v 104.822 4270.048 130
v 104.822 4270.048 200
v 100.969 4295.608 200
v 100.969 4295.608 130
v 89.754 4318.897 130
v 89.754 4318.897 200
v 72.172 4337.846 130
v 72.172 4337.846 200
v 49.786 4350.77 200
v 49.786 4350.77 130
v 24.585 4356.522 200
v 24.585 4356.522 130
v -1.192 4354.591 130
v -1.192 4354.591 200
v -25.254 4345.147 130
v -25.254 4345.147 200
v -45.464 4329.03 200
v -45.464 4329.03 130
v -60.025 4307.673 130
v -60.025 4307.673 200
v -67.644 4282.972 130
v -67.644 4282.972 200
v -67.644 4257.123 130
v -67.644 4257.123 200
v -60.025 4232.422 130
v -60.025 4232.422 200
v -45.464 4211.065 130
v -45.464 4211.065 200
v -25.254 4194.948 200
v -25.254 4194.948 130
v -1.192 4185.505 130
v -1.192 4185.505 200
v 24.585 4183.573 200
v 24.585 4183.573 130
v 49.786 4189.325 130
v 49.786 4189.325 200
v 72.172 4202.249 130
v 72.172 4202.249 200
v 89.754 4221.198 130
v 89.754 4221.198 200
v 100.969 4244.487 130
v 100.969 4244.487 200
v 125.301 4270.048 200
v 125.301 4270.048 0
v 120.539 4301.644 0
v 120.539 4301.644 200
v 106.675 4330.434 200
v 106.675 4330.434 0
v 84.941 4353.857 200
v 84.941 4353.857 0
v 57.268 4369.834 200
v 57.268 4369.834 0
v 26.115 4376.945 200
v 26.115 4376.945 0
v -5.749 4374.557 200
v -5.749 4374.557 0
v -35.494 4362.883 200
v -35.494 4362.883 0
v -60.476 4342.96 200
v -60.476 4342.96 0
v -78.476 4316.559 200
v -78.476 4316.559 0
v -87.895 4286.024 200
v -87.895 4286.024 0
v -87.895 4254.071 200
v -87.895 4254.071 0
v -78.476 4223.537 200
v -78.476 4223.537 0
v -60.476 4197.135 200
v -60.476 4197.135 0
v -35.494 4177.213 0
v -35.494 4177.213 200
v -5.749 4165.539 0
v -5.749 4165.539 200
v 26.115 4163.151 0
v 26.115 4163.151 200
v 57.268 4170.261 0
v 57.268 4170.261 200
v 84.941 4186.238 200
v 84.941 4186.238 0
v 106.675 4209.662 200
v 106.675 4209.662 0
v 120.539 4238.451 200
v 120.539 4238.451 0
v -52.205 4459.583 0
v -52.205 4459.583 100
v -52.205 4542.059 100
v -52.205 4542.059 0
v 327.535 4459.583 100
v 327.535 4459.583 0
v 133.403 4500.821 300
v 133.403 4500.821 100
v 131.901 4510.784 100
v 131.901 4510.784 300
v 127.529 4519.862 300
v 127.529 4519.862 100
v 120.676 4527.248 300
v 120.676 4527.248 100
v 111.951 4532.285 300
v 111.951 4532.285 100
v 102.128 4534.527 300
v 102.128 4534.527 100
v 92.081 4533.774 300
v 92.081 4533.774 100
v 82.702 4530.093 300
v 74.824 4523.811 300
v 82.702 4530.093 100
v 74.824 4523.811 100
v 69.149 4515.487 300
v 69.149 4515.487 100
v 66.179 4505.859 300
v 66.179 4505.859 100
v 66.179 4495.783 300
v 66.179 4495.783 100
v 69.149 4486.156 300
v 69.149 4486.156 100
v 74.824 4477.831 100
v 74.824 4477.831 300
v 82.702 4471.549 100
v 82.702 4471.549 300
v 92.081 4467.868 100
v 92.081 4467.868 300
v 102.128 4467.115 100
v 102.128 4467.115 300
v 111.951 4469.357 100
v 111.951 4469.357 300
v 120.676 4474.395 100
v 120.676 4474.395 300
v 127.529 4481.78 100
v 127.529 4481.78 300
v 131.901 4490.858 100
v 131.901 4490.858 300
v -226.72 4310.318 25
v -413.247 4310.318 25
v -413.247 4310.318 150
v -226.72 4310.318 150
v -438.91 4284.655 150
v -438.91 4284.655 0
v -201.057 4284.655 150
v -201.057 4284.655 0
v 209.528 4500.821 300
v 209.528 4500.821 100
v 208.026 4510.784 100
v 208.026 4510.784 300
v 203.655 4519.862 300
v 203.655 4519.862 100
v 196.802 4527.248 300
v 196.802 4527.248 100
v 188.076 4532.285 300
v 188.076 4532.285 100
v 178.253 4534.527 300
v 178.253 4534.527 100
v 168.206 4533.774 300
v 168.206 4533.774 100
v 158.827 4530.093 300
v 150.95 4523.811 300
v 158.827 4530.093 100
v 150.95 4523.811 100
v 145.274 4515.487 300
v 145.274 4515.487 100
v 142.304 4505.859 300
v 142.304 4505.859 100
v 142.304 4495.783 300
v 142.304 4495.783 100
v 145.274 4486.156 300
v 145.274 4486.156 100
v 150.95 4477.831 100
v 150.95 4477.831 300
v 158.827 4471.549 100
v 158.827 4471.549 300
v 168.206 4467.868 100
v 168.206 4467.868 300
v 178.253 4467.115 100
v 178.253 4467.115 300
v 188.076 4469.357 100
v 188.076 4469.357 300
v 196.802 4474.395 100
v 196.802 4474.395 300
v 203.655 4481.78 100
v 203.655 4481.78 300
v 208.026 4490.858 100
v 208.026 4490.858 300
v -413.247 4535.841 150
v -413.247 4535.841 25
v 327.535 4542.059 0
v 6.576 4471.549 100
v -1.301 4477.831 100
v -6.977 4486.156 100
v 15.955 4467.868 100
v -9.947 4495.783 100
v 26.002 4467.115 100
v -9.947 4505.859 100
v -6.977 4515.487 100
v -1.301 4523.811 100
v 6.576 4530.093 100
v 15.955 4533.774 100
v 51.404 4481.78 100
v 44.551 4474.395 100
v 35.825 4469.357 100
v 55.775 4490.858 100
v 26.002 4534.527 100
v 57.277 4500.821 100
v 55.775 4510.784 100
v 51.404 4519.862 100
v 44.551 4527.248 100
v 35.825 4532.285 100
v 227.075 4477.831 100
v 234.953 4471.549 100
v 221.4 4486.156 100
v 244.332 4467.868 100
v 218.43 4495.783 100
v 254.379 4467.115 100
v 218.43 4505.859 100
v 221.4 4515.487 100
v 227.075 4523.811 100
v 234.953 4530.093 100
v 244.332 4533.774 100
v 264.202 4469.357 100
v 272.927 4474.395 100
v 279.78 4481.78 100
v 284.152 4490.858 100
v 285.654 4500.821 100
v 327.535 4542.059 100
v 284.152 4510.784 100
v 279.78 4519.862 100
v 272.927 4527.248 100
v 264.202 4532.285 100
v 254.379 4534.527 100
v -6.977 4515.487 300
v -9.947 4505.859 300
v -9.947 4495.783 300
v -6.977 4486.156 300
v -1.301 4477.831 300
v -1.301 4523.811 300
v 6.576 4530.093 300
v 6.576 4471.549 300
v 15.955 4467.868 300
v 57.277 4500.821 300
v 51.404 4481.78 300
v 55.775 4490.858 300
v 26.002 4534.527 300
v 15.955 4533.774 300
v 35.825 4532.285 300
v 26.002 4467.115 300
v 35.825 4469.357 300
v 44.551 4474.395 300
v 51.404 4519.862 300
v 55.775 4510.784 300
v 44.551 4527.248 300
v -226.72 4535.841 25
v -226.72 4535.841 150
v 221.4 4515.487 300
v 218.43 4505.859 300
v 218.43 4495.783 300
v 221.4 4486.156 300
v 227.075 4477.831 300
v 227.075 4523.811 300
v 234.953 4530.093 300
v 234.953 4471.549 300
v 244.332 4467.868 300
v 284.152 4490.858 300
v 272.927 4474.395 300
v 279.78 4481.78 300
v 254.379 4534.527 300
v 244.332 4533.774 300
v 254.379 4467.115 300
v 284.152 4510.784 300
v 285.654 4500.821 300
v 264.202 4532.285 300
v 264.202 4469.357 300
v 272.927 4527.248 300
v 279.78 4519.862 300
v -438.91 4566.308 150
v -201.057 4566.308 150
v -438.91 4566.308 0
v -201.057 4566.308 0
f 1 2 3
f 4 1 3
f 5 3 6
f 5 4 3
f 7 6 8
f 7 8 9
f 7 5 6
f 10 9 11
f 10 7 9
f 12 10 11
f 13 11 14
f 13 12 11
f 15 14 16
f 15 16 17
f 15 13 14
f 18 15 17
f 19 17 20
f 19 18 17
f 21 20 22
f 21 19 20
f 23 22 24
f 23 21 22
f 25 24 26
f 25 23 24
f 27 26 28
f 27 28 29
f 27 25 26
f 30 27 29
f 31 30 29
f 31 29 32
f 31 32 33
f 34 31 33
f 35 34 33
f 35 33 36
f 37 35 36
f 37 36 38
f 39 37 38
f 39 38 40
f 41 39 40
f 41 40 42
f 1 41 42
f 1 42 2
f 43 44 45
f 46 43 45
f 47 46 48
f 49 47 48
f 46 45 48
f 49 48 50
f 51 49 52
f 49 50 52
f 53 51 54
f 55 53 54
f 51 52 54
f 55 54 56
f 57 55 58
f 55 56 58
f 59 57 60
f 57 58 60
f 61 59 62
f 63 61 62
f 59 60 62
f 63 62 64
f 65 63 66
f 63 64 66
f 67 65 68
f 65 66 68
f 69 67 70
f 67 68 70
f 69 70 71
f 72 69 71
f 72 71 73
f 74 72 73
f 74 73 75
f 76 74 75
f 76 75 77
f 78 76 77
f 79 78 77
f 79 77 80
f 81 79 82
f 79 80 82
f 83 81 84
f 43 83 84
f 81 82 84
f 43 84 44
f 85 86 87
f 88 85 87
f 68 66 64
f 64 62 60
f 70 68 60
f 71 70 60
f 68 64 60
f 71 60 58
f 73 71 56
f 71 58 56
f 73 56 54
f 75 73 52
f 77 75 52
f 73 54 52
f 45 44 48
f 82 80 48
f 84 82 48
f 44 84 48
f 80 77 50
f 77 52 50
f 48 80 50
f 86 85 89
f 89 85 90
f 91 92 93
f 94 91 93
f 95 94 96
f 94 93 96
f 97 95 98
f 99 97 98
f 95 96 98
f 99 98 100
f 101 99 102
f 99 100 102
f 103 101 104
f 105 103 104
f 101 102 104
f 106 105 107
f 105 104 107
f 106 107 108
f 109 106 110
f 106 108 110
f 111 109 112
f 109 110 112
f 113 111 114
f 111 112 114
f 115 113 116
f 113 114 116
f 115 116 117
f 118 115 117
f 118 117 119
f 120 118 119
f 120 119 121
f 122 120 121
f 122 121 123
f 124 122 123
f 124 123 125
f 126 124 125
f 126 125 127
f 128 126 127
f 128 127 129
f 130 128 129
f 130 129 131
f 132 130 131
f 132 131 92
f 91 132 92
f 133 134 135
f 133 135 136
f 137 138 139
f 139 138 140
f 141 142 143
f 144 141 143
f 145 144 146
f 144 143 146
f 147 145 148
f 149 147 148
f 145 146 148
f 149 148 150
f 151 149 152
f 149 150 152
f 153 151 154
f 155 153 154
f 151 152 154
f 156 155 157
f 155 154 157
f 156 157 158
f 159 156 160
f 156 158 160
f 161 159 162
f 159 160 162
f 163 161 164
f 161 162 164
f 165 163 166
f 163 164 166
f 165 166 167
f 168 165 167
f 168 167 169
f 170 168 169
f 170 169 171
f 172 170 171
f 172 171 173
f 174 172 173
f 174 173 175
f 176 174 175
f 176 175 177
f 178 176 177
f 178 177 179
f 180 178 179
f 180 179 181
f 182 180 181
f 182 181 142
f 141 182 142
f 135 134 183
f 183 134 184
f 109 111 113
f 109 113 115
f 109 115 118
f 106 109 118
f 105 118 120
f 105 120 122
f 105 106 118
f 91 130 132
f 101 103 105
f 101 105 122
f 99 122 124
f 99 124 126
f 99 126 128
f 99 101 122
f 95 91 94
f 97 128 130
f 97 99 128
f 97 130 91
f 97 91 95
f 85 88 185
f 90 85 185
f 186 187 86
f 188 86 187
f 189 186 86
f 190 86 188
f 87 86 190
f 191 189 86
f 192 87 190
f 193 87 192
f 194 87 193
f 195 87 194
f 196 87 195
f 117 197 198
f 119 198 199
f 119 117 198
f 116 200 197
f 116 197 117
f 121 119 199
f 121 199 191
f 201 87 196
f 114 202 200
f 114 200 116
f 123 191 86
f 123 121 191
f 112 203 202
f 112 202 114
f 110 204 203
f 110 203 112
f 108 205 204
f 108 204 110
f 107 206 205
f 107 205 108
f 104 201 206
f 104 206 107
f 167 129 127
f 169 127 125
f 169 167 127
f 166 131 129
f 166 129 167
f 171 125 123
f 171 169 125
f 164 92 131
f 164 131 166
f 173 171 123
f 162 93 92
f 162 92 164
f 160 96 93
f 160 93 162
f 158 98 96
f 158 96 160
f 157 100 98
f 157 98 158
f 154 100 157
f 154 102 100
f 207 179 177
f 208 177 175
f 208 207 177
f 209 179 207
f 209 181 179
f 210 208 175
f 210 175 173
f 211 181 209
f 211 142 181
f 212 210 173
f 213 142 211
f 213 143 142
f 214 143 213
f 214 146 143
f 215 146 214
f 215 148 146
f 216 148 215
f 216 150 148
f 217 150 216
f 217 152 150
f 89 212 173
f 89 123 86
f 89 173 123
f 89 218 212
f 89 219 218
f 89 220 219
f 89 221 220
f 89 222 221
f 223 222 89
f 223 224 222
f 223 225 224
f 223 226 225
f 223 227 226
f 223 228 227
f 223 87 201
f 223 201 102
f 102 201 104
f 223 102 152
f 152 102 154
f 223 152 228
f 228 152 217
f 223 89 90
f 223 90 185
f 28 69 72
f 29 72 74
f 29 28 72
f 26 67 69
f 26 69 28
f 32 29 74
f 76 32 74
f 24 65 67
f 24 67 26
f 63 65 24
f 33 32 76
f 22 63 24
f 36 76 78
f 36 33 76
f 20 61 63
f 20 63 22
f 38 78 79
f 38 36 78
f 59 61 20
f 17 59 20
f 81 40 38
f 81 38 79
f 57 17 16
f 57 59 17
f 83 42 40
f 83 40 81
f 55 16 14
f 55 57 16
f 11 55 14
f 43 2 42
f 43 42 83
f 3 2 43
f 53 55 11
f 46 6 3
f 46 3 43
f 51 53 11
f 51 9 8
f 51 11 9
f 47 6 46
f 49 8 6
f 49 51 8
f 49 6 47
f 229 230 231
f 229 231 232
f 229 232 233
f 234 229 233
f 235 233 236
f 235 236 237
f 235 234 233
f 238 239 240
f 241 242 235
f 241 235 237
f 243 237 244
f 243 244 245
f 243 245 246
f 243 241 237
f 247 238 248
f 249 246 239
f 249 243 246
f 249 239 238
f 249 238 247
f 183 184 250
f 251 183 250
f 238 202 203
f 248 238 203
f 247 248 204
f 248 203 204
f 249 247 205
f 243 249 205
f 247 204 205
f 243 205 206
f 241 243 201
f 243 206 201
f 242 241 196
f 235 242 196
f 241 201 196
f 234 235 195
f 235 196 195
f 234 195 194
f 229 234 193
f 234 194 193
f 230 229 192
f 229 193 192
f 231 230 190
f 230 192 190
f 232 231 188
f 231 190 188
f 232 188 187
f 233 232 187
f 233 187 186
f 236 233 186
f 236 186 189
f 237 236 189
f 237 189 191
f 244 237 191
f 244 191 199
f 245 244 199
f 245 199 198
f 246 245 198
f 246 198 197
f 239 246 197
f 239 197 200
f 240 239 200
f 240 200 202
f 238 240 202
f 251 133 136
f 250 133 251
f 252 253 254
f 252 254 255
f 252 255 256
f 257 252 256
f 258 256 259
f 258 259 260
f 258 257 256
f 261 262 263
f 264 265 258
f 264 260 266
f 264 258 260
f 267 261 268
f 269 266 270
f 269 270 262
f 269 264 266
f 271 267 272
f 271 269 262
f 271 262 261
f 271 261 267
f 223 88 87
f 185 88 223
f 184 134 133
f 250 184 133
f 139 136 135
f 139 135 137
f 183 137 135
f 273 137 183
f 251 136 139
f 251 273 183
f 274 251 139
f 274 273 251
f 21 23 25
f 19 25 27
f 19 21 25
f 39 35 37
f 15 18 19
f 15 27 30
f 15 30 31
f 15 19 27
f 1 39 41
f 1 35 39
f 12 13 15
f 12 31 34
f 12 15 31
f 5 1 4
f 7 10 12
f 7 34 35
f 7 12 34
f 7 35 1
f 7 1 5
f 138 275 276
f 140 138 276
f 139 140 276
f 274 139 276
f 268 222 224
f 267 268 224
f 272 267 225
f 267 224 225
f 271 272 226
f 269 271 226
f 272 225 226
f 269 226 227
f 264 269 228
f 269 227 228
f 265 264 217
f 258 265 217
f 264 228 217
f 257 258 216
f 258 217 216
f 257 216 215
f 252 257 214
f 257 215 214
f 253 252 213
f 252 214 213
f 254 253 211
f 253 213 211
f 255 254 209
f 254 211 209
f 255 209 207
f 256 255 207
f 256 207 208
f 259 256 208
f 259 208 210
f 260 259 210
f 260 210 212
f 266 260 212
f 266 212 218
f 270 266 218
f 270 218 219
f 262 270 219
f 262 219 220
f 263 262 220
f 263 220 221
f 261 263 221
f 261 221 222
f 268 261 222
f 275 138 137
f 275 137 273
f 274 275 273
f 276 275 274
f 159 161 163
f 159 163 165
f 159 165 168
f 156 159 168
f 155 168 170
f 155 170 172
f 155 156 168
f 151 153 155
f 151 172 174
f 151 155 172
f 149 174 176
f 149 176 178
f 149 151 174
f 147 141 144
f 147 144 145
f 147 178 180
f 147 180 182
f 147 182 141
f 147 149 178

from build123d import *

# Parameters (mm, degrees)
F0_W     = 379.739931
F0_H     = 82.475663
F0_R     = 33.80071
F1_DEPTH = 100
F2_DEPTH = 300
F0_W_2   = 237.852231
F0_H_2   = 281.652451
F0_W_3   = 186.527147
F0_H_3   = 225.523829
F3_DEPTH = 150
F4_DEPTH = 25
F0_R_2   = 107.196642
F0_R_3   = 86.717164
F5_DEPTH = 200
F6_DEPTH = 130


with BuildPart() as f1:
    # F0 (on Top) → F1 (new body)
    with BuildSketch(Plane.XY):
        with Locations((137.66469, 4500.821114)):
            Rectangle(F0_W, F0_H)
        with Locations((23.47642, 4500.821114)):
            Circle(F0_R, mode=Mode.SUBTRACT)
        with Locations((99.601933, 4500.821114)):
            Circle(F0_R, mode=Mode.SUBTRACT)
        with Locations((175.727446, 4500.821114)):
            Circle(F0_R, mode=Mode.SUBTRACT)
        with Locations((251.852959, 4500.821114)):
            Circle(F0_R, mode=Mode.SUBTRACT)
    extrude(amount=F1_DEPTH)

    # F0 (on Top) → F2 (join)
    with BuildSketch(Plane.XY):
        with Locations((251.852959, 4500.821114)):
            Circle(F0_R)
        with Locations((175.727446, 4500.821114)):
            Circle(F0_R)
        with Locations((99.601933, 4500.821114)):
            Circle(F0_R)
        with Locations((23.47642, 4500.821114)):
            Circle(F0_R)
    extrude(amount=F2_DEPTH)


with BuildPart() as f3:
    # F0 (on Top) → F3 (new body)
    with BuildSketch(Plane.XY):
        with Locations((-319.983385, 4425.481319)):
            Rectangle(F0_W_2, F0_H_2)
        with Locations((-319.983385, 4423.07955)):
            Rectangle(F0_W_3, F0_H_3, mode=Mode.SUBTRACT)
    extrude(amount=F3_DEPTH)

    # F0 (on Top) → F4 (join)
    with BuildSketch(Plane.XY):
        with Locations((-319.983385, 4423.07955)):
            Rectangle(F0_W_3, F0_H_3)
    extrude(amount=F4_DEPTH)


with BuildPart() as f5:
    # F0 (on Top) → F5 (new body)
    with BuildSketch(Plane.XY):
        with Locations((18.104587, 4270.047665)):
            Circle(F0_R_2)
        with Locations((18.104587, 4270.047665)):
            Circle(F0_R_3, mode=Mode.SUBTRACT)
    extrude(amount=F5_DEPTH)

    # F0 (on Top) → F6 (join)
    with BuildSketch(Plane.XY):
        with Locations((18.104587, 4270.047665)):
            Circle(F0_R_3)
    extrude(amount=F6_DEPTH)


solid = Compound([f1.part, f3.part, f5.part])
